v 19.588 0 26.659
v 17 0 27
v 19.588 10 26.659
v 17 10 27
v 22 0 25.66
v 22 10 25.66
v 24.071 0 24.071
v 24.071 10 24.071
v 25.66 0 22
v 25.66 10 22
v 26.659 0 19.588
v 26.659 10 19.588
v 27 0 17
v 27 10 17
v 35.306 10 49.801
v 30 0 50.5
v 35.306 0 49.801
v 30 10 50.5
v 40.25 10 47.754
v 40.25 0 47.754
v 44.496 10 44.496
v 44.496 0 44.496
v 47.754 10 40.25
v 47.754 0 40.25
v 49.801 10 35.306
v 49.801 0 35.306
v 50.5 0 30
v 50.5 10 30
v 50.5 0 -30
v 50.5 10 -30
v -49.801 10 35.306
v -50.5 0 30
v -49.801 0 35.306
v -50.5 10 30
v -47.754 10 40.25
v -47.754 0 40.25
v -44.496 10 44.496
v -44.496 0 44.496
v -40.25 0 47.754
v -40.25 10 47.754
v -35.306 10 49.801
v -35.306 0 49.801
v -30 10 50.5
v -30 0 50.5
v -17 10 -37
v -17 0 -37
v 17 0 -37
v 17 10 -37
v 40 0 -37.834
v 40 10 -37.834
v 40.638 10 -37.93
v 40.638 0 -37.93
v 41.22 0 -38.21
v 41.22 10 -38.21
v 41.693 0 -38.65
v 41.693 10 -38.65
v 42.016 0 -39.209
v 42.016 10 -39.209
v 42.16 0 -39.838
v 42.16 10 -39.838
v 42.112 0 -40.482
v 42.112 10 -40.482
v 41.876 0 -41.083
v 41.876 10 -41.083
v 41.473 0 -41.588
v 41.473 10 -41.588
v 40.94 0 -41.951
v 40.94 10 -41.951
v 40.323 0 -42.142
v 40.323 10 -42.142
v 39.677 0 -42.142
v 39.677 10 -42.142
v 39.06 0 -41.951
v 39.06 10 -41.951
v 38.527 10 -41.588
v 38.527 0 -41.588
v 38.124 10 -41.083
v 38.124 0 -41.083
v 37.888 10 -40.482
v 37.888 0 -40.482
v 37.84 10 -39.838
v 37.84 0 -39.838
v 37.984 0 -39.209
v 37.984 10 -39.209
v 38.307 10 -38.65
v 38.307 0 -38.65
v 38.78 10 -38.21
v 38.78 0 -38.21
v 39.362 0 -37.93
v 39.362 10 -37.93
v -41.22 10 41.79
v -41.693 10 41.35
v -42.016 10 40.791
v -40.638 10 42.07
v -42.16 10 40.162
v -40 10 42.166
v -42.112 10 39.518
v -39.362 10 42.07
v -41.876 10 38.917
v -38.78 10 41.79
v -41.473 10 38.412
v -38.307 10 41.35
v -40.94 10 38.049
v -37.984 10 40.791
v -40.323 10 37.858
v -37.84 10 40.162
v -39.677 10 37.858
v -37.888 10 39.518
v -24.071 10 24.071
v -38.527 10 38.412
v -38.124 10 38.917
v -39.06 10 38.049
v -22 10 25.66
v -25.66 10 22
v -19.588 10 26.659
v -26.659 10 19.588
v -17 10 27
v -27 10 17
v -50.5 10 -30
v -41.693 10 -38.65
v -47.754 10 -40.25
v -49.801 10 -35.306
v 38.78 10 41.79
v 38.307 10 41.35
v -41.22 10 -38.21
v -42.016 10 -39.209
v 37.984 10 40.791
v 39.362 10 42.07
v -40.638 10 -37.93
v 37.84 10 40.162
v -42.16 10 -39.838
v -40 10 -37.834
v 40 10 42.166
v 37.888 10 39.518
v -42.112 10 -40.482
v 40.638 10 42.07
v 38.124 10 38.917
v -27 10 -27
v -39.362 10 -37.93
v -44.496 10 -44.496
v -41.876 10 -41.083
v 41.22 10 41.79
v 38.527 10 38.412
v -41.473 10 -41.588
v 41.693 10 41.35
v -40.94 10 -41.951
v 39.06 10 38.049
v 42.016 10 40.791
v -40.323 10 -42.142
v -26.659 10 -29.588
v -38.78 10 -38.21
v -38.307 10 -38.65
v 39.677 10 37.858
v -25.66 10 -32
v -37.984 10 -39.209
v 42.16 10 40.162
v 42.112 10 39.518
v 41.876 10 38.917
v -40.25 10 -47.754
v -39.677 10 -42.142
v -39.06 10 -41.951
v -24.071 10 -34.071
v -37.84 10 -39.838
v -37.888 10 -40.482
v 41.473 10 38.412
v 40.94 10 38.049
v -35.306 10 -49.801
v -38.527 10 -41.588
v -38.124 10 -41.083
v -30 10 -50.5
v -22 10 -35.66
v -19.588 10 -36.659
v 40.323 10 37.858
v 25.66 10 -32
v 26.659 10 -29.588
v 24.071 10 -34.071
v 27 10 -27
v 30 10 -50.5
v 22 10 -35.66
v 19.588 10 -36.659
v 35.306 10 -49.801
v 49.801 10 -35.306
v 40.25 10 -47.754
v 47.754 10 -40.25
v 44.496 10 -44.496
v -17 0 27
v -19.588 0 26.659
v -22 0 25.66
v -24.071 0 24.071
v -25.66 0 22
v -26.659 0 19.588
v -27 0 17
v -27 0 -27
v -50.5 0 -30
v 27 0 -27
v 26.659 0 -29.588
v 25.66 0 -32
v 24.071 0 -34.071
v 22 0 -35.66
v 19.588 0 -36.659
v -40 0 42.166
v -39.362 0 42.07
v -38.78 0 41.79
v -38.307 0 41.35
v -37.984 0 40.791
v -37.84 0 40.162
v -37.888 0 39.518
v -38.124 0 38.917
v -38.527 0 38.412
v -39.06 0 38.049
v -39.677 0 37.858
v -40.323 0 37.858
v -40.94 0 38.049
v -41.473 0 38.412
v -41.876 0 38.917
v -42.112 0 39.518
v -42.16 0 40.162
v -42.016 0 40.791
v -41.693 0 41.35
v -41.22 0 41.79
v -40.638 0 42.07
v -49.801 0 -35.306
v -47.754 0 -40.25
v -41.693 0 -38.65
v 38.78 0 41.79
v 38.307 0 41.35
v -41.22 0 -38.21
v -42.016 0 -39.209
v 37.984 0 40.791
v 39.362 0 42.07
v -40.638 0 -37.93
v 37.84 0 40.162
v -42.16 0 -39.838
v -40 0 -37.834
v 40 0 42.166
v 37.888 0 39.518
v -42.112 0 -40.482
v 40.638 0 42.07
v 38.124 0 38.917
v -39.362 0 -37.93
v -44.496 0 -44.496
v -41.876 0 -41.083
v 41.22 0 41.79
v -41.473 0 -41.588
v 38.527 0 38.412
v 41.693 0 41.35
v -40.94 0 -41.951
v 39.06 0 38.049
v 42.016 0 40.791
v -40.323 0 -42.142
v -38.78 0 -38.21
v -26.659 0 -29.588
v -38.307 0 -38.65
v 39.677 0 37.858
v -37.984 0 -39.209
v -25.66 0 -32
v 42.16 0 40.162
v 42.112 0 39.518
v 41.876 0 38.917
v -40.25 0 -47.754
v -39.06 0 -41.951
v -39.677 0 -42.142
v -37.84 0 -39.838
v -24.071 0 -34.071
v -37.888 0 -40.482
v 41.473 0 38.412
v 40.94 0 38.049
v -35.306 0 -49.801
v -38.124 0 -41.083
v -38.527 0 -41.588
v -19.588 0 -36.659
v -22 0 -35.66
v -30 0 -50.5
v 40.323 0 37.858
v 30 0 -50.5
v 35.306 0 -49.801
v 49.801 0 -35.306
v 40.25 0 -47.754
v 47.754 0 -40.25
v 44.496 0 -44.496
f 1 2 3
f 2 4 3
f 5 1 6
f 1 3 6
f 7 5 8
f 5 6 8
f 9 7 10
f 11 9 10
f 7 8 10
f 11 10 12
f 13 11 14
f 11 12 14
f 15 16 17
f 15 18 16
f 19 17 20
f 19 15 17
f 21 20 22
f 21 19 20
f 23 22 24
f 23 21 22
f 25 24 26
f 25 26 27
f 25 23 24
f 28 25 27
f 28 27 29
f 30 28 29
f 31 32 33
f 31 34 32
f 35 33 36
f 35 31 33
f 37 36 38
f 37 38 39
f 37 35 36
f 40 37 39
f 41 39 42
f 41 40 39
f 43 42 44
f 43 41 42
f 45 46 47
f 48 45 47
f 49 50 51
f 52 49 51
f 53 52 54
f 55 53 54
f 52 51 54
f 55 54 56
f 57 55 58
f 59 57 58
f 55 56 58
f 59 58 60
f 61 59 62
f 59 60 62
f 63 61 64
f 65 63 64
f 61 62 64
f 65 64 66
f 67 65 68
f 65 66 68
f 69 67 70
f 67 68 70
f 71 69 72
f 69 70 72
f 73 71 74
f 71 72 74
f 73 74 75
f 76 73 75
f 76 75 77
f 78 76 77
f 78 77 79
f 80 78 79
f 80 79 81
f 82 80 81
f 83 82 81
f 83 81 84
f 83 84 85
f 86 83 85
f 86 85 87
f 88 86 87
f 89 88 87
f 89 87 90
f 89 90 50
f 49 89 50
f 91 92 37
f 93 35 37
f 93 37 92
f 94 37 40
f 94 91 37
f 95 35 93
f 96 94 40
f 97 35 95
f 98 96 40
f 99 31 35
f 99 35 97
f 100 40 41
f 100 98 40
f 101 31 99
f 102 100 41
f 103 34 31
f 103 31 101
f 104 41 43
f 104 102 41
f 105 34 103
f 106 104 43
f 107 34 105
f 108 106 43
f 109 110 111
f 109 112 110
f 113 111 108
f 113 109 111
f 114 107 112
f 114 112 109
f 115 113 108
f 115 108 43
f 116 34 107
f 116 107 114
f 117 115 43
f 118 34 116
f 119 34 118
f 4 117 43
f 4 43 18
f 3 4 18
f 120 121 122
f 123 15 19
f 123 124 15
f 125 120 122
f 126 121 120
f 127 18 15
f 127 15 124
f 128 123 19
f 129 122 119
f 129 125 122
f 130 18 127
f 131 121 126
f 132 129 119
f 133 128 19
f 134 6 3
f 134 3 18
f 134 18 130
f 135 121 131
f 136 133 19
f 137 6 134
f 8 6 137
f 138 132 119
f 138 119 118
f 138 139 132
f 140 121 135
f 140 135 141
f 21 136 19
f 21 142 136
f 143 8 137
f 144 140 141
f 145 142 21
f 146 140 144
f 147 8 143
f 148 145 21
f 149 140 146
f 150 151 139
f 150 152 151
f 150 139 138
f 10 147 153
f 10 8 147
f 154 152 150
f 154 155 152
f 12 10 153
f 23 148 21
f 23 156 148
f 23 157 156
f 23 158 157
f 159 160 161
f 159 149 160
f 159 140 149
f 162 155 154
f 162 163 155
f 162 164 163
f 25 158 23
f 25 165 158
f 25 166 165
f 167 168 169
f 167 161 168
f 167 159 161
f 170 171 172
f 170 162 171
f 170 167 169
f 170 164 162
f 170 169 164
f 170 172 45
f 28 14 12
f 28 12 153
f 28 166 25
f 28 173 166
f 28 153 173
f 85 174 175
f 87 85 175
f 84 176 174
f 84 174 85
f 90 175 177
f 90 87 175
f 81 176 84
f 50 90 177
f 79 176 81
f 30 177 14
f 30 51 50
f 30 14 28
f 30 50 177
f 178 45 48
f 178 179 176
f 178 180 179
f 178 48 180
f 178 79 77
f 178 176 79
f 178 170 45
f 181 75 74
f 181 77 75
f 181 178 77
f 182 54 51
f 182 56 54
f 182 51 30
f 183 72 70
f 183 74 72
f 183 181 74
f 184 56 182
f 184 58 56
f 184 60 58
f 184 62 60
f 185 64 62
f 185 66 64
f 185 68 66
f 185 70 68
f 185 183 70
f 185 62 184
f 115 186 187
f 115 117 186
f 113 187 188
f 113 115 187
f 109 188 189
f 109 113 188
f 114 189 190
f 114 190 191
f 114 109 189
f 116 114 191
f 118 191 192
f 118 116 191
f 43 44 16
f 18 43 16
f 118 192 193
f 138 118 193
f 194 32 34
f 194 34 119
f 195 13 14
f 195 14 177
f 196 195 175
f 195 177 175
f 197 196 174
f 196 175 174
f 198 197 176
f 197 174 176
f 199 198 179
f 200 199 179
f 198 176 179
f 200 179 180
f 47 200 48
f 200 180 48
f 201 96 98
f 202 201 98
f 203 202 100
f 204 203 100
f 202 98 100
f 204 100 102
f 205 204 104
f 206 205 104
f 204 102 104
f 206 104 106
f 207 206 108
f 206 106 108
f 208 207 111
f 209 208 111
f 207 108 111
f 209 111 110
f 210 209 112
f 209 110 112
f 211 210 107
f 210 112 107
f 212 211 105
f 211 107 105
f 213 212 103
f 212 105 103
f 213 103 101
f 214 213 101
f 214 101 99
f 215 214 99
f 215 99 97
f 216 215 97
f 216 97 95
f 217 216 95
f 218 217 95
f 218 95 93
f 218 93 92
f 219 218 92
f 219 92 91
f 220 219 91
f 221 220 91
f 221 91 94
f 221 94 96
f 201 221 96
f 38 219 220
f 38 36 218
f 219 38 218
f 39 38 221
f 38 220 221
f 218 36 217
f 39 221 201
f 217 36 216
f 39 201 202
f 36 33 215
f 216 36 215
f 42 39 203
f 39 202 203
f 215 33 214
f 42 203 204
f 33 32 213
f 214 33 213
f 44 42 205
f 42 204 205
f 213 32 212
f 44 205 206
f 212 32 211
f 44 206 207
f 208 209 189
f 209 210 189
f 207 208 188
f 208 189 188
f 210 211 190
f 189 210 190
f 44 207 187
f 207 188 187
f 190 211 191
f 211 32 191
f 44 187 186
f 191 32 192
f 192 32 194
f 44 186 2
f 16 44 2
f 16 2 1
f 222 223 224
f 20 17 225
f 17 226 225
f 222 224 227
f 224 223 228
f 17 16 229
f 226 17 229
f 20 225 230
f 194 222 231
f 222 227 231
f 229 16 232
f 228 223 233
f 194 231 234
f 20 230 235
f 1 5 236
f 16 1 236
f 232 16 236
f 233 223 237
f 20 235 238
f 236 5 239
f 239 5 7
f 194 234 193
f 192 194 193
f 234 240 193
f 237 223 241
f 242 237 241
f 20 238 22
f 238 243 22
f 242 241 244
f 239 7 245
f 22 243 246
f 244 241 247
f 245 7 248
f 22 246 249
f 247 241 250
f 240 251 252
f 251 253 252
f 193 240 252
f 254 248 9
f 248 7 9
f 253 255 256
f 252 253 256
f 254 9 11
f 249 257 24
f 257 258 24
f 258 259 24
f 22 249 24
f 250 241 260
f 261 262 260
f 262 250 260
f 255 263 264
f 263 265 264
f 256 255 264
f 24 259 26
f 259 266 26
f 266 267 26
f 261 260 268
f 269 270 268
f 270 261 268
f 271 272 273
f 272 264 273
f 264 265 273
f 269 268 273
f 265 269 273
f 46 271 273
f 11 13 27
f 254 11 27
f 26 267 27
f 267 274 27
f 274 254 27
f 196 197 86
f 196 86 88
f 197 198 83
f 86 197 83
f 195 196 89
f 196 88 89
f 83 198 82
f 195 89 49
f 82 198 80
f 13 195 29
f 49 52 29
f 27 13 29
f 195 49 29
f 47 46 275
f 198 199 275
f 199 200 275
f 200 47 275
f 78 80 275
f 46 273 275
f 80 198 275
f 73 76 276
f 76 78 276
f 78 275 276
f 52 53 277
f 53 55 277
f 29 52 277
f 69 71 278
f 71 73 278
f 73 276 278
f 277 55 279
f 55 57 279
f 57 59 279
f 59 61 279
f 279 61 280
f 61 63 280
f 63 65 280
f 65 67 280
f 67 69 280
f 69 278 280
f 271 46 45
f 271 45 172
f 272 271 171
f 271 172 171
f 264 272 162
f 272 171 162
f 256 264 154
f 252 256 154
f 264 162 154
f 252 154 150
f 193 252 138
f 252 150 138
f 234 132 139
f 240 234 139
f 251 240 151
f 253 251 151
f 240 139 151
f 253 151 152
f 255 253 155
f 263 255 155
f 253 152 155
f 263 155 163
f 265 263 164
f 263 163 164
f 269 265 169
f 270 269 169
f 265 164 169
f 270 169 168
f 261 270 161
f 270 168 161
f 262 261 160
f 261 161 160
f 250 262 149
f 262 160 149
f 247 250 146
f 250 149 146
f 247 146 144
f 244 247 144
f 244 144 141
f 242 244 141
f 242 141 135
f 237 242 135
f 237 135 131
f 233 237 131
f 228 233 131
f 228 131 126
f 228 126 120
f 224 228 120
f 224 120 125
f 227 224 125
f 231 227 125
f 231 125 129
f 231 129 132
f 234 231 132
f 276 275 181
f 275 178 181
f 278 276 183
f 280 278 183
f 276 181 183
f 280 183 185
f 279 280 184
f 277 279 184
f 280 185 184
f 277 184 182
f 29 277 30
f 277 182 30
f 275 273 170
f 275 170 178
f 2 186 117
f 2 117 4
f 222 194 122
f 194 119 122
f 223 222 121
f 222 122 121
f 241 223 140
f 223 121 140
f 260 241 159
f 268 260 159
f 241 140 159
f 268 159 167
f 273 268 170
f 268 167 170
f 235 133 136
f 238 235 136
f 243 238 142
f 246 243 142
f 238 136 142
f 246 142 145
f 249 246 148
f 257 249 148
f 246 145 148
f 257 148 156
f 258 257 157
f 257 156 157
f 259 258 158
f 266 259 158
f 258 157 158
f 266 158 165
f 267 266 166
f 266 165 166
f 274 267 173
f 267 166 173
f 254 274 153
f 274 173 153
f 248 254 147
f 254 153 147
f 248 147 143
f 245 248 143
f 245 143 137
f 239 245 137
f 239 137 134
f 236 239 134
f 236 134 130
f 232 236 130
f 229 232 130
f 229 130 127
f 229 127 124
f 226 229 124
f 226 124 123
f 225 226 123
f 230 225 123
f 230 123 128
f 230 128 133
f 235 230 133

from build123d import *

# Parameters (mm, degrees)
SKETCH_1_W          = 101
SKETCH_1_H          = 101
SKETCH_1_W_2        = 54
SKETCH_1_H_2        = 64
EXTRUDE_1_DEPTH     = 10
FILLET_1_R          = 20.5
FILLET_2_R          = 10
SKETCH_2_R          = 2.166
CUT_EXTRUDE_1_DEPTH = 73.114492302


with BuildPart() as part:
    # 草图1 → 凸台-拉伸1 (new body)
    with BuildSketch(Plane(origin=(0, 0, 0), x_dir=(1, 0, 0), z_dir=(0, 1, 0))):
        Rectangle(SKETCH_1_W, SKETCH_1_H)
        with Locations((0, 5)):
            Rectangle(SKETCH_1_W_2, SKETCH_1_H_2, mode=Mode.SUBTRACT)
    extrude(amount=EXTRUDE_1_DEPTH)

    # 圆角1
    fillet_1_edges = [part.edges().sort_by_distance(p)[0] for p in [
        (-50.5, 5, -50.5),
        (50.5, 5, -50.5),
        (50.5, 5, 50.5),
        (-50.5, 5, 50.5),
    ]]
    fillet(fillet_1_edges, radius=FILLET_1_R)

    # 圆角2
    fillet_2_edges = [part.edges().sort_by_distance(p)[0] for p in [
        (-27, 5, -37),
        (-27, 5, 27),
        (27, 5, 27),
        (27, 5, -37),
    ]]
    fillet(fillet_2_edges, radius=FILLET_2_R)

    # 草图2 → 切除-拉伸1 (cut, through all)
    with BuildSketch(Plane(origin=(0, 10, 0), x_dir=(1, 0, 0), z_dir=(0, 1, 0))):
        with Locations(Location((-40, 40, 0), (0, 0, 270))):
            Circle(SKETCH_2_R)
        with Locations(Location((40, 40, 0), (0, 0, 270))):
            Circle(SKETCH_2_R)
        with Locations(Location((-40, -40, 0), (0, 0, 270))):
            Circle(SKETCH_2_R)
        with Locations(Location((40, -40, 0), (0, 0, 270))):
            Circle(SKETCH_2_R)
    extrude(amount=-CUT_EXTRUDE_1_DEPTH, mode=Mode.SUBTRACT)


solid = part.part
